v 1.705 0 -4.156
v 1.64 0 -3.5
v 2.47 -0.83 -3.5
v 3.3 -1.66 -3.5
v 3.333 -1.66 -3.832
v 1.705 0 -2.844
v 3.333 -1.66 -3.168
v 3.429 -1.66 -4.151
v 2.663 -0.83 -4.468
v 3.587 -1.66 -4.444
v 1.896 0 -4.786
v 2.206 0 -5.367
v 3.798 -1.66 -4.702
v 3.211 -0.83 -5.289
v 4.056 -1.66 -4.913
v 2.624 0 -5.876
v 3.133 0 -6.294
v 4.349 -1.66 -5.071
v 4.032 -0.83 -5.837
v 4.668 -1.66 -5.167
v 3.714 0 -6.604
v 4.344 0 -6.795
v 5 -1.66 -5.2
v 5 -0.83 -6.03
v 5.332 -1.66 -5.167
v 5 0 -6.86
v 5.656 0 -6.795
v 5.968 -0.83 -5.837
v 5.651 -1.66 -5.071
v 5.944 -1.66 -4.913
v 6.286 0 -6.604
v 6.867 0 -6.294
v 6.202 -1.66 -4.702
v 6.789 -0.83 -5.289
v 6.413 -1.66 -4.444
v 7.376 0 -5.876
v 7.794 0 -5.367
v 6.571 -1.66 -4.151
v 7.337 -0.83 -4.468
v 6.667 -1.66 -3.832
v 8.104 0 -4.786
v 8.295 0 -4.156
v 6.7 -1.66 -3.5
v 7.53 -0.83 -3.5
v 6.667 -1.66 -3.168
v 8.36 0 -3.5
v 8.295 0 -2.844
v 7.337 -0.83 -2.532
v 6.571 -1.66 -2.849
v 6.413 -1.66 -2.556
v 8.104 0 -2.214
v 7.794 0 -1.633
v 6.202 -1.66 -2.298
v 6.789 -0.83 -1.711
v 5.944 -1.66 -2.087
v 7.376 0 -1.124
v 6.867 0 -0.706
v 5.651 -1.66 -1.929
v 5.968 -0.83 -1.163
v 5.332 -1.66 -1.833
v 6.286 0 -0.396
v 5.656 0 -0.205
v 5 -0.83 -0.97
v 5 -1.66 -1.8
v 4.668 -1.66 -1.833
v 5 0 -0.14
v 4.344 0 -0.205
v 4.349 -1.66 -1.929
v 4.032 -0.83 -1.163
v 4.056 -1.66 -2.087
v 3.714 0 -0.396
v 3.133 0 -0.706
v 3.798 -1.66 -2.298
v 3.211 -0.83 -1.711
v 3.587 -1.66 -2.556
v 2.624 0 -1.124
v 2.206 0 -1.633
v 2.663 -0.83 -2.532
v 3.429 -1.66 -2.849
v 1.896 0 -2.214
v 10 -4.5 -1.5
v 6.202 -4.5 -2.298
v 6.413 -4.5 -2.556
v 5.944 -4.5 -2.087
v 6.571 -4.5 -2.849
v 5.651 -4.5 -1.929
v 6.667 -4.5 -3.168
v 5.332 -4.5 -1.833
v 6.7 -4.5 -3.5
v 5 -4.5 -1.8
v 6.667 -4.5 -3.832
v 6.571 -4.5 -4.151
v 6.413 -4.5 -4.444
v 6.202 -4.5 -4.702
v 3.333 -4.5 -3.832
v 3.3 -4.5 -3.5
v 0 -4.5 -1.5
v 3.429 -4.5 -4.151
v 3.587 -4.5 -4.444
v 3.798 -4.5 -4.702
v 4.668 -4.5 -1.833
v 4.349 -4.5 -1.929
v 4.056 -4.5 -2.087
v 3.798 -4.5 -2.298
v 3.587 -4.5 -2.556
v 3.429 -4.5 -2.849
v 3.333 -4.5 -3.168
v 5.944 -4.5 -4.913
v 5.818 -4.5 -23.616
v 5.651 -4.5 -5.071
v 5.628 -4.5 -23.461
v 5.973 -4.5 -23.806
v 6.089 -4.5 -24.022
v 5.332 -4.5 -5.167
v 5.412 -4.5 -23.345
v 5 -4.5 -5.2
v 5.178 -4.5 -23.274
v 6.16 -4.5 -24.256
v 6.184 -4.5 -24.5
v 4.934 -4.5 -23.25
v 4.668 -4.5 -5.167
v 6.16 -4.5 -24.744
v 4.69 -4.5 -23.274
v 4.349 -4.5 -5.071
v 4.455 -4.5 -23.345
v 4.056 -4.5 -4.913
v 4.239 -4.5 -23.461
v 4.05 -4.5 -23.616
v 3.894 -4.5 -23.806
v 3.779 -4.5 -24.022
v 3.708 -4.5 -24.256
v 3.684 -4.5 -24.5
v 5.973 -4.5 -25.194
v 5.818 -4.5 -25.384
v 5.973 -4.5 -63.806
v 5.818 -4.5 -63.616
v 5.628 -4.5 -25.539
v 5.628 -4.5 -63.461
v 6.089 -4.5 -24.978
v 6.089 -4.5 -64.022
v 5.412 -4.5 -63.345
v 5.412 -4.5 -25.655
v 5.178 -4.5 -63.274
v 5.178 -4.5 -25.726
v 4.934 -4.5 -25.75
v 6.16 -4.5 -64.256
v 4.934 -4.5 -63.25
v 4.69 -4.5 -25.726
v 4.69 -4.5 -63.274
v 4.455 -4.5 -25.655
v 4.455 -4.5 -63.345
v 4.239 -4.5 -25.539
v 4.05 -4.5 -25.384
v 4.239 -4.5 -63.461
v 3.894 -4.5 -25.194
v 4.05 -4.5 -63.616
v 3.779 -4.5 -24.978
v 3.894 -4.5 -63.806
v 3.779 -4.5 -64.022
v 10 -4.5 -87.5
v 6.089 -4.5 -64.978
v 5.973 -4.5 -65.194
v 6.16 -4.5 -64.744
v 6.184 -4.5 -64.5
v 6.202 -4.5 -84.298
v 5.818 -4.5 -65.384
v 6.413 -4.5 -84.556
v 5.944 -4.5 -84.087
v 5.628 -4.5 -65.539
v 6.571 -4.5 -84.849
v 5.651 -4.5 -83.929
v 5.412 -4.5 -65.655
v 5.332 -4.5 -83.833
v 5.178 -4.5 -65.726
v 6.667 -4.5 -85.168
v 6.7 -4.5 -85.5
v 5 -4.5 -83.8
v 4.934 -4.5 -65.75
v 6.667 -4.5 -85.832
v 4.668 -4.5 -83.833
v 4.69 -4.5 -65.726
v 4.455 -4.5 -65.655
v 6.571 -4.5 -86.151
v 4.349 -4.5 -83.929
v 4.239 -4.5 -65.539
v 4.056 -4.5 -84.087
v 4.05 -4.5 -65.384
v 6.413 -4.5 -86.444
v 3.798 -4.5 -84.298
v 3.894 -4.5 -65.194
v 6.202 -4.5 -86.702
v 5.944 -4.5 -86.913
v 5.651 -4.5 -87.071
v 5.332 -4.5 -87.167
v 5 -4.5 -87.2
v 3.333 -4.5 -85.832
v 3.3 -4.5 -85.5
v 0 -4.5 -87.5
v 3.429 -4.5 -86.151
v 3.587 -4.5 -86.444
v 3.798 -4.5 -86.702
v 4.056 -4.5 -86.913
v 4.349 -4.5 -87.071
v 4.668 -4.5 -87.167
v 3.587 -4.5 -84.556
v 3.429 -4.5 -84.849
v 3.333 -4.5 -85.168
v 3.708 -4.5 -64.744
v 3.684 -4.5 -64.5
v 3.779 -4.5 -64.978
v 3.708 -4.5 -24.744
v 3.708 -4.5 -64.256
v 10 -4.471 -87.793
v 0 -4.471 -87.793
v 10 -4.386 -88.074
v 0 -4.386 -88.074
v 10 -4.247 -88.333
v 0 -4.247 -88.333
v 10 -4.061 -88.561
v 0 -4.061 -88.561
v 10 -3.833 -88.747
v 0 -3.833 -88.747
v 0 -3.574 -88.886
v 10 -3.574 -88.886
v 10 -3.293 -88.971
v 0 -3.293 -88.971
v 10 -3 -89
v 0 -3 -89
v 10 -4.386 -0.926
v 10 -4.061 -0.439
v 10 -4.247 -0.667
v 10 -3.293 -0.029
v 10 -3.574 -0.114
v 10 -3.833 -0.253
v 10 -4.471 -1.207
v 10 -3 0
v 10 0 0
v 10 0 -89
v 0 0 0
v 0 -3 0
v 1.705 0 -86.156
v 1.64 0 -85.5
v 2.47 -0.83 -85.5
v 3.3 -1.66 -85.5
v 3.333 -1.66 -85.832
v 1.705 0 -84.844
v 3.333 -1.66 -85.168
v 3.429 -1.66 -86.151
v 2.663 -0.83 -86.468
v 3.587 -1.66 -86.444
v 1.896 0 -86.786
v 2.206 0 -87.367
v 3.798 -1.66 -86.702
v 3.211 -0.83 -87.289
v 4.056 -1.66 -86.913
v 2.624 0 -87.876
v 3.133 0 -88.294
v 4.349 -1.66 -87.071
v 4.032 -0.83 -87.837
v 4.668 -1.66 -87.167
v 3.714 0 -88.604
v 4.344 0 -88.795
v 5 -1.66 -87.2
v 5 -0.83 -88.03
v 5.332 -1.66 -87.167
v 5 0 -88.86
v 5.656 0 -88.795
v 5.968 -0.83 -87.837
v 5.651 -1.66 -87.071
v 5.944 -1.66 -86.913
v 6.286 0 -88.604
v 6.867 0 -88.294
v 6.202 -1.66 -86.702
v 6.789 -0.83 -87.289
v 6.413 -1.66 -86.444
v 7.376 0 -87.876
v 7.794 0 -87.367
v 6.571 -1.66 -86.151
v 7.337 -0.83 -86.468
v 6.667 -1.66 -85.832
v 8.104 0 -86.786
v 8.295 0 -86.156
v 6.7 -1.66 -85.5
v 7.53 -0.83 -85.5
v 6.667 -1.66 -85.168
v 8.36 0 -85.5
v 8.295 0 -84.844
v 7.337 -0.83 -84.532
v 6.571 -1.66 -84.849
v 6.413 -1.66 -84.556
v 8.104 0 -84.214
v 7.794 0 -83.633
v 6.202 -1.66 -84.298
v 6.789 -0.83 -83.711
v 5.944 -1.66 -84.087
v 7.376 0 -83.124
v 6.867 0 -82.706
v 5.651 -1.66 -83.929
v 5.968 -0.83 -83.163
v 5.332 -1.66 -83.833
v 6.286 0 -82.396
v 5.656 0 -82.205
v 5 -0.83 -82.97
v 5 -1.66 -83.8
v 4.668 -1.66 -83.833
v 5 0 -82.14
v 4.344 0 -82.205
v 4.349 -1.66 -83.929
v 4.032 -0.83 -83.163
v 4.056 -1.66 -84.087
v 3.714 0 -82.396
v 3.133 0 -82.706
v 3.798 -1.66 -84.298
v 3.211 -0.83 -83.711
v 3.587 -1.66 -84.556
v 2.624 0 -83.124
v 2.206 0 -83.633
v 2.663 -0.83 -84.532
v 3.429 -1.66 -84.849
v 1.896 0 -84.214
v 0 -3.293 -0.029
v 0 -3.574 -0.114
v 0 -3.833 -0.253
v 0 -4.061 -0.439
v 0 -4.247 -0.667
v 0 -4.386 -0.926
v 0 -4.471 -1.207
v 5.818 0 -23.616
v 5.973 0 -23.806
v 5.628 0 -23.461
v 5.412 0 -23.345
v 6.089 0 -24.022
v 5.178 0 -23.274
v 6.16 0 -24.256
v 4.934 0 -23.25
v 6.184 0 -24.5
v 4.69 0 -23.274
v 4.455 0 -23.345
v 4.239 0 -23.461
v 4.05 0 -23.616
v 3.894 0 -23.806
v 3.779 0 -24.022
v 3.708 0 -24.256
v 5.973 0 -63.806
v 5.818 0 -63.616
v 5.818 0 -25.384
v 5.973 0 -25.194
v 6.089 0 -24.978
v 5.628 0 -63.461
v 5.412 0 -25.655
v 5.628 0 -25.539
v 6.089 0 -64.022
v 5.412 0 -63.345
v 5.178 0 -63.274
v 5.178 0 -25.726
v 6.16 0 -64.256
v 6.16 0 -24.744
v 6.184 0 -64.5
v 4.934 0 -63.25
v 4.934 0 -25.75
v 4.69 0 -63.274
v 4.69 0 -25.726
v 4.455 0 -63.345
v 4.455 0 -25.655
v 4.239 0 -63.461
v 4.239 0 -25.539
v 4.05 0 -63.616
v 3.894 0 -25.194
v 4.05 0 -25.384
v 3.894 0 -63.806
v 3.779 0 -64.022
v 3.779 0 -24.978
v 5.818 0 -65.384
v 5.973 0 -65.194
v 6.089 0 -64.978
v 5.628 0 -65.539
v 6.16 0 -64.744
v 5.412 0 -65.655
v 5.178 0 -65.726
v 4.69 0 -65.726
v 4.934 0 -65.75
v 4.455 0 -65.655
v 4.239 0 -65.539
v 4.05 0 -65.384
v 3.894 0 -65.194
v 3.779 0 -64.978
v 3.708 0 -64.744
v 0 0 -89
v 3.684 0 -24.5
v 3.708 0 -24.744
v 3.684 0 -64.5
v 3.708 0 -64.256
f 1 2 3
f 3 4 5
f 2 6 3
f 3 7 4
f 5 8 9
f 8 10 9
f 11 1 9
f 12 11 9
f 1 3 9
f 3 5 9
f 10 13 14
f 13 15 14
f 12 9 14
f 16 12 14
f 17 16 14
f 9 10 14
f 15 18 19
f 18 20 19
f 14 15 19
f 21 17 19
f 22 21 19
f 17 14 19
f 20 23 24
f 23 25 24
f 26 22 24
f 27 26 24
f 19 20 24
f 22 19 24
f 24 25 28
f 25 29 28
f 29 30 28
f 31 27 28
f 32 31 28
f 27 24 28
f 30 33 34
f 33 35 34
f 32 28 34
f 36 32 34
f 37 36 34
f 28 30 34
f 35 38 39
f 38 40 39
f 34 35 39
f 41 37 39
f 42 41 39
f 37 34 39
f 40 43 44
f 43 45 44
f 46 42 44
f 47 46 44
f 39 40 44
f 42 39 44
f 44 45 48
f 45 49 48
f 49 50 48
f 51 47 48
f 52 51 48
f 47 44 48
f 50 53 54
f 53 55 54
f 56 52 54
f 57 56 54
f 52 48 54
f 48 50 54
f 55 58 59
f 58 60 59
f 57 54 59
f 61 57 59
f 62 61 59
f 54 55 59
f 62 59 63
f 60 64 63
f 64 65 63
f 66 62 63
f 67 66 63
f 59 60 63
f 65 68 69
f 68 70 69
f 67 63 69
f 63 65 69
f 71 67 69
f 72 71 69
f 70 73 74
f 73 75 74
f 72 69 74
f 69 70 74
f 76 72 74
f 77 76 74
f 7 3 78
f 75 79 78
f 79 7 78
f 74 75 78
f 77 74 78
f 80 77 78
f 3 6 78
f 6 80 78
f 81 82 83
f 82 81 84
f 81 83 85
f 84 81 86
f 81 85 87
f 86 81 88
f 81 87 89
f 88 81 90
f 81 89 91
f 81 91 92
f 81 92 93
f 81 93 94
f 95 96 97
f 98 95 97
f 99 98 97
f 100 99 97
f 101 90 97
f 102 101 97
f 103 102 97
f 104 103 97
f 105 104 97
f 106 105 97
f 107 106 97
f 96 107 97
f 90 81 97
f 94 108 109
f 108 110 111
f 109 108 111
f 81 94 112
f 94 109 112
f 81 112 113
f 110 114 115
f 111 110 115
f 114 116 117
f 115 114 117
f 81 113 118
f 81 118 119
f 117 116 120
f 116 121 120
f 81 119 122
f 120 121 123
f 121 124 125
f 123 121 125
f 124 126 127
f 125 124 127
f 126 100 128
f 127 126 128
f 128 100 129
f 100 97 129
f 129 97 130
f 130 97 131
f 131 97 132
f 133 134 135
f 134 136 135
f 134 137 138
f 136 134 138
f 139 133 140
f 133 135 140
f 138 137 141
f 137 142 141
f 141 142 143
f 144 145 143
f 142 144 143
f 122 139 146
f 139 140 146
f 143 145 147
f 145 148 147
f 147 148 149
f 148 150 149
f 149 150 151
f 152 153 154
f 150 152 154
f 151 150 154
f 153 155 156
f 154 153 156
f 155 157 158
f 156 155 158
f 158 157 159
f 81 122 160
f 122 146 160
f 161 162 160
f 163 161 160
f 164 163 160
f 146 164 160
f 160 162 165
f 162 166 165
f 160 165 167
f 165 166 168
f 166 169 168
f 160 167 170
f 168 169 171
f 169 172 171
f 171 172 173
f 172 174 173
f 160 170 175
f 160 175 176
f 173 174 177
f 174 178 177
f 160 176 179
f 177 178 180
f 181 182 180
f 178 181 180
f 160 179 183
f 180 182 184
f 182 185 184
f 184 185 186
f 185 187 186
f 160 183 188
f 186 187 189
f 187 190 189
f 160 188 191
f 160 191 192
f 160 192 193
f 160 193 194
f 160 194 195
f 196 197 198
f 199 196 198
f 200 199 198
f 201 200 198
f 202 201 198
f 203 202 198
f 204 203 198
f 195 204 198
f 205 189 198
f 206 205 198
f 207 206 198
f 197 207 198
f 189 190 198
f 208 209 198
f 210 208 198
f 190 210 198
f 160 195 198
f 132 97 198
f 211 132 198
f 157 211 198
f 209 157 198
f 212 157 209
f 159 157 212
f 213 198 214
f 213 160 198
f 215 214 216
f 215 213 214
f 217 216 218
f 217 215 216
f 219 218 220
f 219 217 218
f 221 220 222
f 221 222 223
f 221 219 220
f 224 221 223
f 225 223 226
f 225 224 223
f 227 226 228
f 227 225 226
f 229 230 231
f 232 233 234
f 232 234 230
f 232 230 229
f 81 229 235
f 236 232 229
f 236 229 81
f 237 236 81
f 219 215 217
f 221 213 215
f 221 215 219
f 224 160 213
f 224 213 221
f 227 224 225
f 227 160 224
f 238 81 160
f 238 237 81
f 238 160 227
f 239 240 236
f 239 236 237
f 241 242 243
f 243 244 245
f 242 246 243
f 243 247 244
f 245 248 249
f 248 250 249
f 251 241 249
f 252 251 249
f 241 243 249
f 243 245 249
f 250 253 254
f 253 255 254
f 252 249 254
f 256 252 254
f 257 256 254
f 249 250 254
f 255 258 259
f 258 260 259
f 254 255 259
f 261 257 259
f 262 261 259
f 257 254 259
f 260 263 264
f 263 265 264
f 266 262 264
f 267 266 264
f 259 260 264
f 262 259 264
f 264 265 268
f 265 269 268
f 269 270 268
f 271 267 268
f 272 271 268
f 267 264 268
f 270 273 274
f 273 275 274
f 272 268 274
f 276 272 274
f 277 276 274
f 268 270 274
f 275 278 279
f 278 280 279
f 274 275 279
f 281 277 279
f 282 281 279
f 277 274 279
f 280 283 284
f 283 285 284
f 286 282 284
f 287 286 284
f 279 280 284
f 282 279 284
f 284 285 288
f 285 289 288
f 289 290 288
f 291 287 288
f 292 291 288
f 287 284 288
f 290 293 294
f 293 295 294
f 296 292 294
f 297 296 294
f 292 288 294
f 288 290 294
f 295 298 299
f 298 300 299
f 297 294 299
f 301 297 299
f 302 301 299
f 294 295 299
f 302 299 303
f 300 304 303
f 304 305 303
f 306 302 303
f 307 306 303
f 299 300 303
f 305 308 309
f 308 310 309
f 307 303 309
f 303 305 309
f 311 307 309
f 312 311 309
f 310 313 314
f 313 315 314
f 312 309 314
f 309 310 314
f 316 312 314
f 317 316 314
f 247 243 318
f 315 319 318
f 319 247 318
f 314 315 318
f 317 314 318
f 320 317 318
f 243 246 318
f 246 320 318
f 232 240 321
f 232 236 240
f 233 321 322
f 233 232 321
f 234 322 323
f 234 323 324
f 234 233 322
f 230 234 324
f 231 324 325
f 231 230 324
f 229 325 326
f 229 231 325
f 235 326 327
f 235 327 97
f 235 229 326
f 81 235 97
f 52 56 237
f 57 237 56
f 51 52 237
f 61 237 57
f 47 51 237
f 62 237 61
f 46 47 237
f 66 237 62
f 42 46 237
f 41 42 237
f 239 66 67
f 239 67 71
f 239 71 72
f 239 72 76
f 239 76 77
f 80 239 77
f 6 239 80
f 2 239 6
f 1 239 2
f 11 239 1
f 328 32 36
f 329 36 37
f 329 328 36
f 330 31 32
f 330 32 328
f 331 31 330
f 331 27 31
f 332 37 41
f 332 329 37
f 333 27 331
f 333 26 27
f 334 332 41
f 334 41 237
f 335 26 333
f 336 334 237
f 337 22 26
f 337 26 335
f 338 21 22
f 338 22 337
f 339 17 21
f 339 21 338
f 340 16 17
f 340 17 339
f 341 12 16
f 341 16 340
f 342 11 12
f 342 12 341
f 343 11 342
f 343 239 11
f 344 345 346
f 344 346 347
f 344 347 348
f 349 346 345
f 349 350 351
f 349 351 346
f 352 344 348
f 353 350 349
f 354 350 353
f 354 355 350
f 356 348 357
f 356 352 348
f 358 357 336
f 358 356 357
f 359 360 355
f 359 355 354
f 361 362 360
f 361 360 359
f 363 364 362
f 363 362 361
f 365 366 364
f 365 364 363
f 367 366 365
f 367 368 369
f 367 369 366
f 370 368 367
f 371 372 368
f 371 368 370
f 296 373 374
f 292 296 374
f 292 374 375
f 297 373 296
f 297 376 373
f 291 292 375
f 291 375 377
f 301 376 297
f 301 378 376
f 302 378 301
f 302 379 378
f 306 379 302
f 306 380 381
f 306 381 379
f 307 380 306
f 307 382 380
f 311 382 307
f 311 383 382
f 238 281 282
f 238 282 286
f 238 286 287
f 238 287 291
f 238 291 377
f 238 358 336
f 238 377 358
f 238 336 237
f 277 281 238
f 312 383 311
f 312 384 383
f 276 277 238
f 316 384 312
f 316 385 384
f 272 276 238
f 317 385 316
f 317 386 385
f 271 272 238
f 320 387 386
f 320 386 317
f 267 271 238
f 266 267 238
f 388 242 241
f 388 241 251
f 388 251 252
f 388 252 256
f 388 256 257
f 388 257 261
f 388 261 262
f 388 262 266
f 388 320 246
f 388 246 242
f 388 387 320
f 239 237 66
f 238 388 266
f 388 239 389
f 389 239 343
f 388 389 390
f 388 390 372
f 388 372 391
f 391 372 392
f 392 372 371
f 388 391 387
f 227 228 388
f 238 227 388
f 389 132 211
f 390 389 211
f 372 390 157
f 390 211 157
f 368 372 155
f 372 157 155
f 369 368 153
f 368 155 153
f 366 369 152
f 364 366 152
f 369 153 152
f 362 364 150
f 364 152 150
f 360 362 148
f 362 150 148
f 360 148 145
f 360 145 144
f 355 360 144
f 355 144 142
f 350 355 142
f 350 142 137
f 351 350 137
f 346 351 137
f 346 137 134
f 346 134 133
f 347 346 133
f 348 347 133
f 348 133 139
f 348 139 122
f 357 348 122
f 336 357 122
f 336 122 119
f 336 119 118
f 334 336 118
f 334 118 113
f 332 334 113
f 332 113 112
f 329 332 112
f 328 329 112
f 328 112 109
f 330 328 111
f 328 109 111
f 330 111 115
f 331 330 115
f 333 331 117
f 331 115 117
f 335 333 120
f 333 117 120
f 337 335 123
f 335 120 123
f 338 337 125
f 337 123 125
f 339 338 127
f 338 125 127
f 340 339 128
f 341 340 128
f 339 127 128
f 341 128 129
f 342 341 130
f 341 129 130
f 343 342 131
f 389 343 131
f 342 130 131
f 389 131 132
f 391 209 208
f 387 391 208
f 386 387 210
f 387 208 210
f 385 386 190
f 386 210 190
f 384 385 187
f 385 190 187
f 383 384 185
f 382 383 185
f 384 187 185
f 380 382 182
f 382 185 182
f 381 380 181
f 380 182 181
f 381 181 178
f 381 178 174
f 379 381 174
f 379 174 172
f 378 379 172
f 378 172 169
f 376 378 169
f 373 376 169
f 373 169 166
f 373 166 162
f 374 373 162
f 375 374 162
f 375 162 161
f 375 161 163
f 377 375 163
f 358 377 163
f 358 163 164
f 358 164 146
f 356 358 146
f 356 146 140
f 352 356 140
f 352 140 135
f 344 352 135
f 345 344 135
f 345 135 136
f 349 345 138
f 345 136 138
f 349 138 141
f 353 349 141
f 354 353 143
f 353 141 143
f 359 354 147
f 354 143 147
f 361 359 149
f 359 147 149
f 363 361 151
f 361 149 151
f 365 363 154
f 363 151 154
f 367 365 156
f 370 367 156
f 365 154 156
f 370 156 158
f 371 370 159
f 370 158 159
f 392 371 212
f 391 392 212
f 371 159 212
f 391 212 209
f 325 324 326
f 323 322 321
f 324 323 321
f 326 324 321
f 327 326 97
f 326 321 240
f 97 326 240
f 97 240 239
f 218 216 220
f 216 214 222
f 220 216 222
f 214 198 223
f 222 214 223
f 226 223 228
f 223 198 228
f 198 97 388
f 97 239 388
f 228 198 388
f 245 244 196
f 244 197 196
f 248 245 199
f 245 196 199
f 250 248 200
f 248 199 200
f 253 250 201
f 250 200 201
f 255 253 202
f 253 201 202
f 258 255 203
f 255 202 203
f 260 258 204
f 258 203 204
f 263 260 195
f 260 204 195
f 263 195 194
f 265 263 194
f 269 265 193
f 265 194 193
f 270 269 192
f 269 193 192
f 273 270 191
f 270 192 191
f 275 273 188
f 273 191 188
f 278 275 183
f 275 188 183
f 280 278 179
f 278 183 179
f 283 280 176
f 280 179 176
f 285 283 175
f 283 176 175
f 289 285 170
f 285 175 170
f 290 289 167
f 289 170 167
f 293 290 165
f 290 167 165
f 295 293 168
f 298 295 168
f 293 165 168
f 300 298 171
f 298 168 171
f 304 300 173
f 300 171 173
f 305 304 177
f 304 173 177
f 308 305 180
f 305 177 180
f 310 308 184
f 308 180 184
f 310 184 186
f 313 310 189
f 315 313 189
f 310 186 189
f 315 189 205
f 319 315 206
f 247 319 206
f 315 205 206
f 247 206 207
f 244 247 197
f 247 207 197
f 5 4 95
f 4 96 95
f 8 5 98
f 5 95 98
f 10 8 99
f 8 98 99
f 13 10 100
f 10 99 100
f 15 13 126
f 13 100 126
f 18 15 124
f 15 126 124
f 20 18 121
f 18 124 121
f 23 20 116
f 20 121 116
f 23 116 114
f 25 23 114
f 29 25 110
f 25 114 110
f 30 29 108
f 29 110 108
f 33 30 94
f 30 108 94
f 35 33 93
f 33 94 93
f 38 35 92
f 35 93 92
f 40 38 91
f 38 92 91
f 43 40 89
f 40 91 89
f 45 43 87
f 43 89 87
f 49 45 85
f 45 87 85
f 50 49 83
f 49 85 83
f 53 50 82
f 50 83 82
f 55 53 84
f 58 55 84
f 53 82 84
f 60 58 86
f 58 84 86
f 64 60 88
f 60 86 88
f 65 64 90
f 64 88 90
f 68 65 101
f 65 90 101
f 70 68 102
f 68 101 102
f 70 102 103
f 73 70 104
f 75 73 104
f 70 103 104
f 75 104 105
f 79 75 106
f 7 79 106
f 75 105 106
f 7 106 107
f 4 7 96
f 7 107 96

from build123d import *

# Parameters (mm, degrees)
SKETCH1_W                                            = 89
SKETCH1_H                                            = 4.5
BOSS_EXTRUDE1_DEPTH                                  = 10
FILLET1_R                                            = 1.5
CSK_FOR_M3_HEX_SOCKET_COUNTERSUNK_CAP_SC_D           = 3.4
CSK_FOR_M3_HEX_SOCKET_COUNTERSUNK_CAP_SC_CSINK_D     = 6.72
CSK_FOR_M3_HEX_SOCKET_COUNTERSUNK_CAP_SC_CSINK_ANGLE = 90
M3_TAPPED_HOLE1_D                                    = 2.5
M3_TAPPED_HOLE1_DEPTH                                = 7.5
M3_TAPPED_HOLE1_TIP                                  = 0.751075774


with BuildPart() as part:
    # Sketch1 → Boss-Extrude1 (new body)
    with BuildSketch(Plane(origin=(0, 0, 0), x_dir=(0, 0, -1), z_dir=(1, 0, 0))):
        with Locations((44.5, -2.25)):
            Rectangle(SKETCH1_W, SKETCH1_H)
    extrude(amount=BOSS_EXTRUDE1_DEPTH)

    # Fillet1
    fillet1_edges = [part.edges().sort_by_distance(p)[0] for p in [
        (5, -4.5, -89),
        (5, -4.5, 0),
    ]]
    fillet(fillet1_edges, radius=FILLET1_R)

    # CSK for M3 Hex Socket Countersunk Cap Screw1 (through all)
    with Locations(Plane(origin=(0, 0, 0), x_dir=(1, 0, 0), z_dir=(0, 1, 0))):
        with Locations((5, 3.5), (5, 85.5)):
            CounterSinkHole(CSK_FOR_M3_HEX_SOCKET_COUNTERSUNK_CAP_SC_D / 2, CSK_FOR_M3_HEX_SOCKET_COUNTERSUNK_CAP_SC_CSINK_D / 2, counter_sink_angle=CSK_FOR_M3_HEX_SOCKET_COUNTERSUNK_CAP_SC_CSINK_ANGLE)

    # M3 Tapped Hole1
    with Locations(Plane(origin=(0, 0, 0), x_dir=(1, 0, 0), z_dir=(0, 1, 0))):
        with Locations((4.933736509, 24.5), (4.933736509, 64.5)):
            Hole(M3_TAPPED_HOLE1_D / 2, depth=M3_TAPPED_HOLE1_DEPTH)
            with Locations((0, 0, -(M3_TAPPED_HOLE1_DEPTH + M3_TAPPED_HOLE1_TIP / 2))):  # 118° drill point
                Cone(0, M3_TAPPED_HOLE1_D / 2, M3_TAPPED_HOLE1_TIP, mode=Mode.SUBTRACT)


solid = part.part
